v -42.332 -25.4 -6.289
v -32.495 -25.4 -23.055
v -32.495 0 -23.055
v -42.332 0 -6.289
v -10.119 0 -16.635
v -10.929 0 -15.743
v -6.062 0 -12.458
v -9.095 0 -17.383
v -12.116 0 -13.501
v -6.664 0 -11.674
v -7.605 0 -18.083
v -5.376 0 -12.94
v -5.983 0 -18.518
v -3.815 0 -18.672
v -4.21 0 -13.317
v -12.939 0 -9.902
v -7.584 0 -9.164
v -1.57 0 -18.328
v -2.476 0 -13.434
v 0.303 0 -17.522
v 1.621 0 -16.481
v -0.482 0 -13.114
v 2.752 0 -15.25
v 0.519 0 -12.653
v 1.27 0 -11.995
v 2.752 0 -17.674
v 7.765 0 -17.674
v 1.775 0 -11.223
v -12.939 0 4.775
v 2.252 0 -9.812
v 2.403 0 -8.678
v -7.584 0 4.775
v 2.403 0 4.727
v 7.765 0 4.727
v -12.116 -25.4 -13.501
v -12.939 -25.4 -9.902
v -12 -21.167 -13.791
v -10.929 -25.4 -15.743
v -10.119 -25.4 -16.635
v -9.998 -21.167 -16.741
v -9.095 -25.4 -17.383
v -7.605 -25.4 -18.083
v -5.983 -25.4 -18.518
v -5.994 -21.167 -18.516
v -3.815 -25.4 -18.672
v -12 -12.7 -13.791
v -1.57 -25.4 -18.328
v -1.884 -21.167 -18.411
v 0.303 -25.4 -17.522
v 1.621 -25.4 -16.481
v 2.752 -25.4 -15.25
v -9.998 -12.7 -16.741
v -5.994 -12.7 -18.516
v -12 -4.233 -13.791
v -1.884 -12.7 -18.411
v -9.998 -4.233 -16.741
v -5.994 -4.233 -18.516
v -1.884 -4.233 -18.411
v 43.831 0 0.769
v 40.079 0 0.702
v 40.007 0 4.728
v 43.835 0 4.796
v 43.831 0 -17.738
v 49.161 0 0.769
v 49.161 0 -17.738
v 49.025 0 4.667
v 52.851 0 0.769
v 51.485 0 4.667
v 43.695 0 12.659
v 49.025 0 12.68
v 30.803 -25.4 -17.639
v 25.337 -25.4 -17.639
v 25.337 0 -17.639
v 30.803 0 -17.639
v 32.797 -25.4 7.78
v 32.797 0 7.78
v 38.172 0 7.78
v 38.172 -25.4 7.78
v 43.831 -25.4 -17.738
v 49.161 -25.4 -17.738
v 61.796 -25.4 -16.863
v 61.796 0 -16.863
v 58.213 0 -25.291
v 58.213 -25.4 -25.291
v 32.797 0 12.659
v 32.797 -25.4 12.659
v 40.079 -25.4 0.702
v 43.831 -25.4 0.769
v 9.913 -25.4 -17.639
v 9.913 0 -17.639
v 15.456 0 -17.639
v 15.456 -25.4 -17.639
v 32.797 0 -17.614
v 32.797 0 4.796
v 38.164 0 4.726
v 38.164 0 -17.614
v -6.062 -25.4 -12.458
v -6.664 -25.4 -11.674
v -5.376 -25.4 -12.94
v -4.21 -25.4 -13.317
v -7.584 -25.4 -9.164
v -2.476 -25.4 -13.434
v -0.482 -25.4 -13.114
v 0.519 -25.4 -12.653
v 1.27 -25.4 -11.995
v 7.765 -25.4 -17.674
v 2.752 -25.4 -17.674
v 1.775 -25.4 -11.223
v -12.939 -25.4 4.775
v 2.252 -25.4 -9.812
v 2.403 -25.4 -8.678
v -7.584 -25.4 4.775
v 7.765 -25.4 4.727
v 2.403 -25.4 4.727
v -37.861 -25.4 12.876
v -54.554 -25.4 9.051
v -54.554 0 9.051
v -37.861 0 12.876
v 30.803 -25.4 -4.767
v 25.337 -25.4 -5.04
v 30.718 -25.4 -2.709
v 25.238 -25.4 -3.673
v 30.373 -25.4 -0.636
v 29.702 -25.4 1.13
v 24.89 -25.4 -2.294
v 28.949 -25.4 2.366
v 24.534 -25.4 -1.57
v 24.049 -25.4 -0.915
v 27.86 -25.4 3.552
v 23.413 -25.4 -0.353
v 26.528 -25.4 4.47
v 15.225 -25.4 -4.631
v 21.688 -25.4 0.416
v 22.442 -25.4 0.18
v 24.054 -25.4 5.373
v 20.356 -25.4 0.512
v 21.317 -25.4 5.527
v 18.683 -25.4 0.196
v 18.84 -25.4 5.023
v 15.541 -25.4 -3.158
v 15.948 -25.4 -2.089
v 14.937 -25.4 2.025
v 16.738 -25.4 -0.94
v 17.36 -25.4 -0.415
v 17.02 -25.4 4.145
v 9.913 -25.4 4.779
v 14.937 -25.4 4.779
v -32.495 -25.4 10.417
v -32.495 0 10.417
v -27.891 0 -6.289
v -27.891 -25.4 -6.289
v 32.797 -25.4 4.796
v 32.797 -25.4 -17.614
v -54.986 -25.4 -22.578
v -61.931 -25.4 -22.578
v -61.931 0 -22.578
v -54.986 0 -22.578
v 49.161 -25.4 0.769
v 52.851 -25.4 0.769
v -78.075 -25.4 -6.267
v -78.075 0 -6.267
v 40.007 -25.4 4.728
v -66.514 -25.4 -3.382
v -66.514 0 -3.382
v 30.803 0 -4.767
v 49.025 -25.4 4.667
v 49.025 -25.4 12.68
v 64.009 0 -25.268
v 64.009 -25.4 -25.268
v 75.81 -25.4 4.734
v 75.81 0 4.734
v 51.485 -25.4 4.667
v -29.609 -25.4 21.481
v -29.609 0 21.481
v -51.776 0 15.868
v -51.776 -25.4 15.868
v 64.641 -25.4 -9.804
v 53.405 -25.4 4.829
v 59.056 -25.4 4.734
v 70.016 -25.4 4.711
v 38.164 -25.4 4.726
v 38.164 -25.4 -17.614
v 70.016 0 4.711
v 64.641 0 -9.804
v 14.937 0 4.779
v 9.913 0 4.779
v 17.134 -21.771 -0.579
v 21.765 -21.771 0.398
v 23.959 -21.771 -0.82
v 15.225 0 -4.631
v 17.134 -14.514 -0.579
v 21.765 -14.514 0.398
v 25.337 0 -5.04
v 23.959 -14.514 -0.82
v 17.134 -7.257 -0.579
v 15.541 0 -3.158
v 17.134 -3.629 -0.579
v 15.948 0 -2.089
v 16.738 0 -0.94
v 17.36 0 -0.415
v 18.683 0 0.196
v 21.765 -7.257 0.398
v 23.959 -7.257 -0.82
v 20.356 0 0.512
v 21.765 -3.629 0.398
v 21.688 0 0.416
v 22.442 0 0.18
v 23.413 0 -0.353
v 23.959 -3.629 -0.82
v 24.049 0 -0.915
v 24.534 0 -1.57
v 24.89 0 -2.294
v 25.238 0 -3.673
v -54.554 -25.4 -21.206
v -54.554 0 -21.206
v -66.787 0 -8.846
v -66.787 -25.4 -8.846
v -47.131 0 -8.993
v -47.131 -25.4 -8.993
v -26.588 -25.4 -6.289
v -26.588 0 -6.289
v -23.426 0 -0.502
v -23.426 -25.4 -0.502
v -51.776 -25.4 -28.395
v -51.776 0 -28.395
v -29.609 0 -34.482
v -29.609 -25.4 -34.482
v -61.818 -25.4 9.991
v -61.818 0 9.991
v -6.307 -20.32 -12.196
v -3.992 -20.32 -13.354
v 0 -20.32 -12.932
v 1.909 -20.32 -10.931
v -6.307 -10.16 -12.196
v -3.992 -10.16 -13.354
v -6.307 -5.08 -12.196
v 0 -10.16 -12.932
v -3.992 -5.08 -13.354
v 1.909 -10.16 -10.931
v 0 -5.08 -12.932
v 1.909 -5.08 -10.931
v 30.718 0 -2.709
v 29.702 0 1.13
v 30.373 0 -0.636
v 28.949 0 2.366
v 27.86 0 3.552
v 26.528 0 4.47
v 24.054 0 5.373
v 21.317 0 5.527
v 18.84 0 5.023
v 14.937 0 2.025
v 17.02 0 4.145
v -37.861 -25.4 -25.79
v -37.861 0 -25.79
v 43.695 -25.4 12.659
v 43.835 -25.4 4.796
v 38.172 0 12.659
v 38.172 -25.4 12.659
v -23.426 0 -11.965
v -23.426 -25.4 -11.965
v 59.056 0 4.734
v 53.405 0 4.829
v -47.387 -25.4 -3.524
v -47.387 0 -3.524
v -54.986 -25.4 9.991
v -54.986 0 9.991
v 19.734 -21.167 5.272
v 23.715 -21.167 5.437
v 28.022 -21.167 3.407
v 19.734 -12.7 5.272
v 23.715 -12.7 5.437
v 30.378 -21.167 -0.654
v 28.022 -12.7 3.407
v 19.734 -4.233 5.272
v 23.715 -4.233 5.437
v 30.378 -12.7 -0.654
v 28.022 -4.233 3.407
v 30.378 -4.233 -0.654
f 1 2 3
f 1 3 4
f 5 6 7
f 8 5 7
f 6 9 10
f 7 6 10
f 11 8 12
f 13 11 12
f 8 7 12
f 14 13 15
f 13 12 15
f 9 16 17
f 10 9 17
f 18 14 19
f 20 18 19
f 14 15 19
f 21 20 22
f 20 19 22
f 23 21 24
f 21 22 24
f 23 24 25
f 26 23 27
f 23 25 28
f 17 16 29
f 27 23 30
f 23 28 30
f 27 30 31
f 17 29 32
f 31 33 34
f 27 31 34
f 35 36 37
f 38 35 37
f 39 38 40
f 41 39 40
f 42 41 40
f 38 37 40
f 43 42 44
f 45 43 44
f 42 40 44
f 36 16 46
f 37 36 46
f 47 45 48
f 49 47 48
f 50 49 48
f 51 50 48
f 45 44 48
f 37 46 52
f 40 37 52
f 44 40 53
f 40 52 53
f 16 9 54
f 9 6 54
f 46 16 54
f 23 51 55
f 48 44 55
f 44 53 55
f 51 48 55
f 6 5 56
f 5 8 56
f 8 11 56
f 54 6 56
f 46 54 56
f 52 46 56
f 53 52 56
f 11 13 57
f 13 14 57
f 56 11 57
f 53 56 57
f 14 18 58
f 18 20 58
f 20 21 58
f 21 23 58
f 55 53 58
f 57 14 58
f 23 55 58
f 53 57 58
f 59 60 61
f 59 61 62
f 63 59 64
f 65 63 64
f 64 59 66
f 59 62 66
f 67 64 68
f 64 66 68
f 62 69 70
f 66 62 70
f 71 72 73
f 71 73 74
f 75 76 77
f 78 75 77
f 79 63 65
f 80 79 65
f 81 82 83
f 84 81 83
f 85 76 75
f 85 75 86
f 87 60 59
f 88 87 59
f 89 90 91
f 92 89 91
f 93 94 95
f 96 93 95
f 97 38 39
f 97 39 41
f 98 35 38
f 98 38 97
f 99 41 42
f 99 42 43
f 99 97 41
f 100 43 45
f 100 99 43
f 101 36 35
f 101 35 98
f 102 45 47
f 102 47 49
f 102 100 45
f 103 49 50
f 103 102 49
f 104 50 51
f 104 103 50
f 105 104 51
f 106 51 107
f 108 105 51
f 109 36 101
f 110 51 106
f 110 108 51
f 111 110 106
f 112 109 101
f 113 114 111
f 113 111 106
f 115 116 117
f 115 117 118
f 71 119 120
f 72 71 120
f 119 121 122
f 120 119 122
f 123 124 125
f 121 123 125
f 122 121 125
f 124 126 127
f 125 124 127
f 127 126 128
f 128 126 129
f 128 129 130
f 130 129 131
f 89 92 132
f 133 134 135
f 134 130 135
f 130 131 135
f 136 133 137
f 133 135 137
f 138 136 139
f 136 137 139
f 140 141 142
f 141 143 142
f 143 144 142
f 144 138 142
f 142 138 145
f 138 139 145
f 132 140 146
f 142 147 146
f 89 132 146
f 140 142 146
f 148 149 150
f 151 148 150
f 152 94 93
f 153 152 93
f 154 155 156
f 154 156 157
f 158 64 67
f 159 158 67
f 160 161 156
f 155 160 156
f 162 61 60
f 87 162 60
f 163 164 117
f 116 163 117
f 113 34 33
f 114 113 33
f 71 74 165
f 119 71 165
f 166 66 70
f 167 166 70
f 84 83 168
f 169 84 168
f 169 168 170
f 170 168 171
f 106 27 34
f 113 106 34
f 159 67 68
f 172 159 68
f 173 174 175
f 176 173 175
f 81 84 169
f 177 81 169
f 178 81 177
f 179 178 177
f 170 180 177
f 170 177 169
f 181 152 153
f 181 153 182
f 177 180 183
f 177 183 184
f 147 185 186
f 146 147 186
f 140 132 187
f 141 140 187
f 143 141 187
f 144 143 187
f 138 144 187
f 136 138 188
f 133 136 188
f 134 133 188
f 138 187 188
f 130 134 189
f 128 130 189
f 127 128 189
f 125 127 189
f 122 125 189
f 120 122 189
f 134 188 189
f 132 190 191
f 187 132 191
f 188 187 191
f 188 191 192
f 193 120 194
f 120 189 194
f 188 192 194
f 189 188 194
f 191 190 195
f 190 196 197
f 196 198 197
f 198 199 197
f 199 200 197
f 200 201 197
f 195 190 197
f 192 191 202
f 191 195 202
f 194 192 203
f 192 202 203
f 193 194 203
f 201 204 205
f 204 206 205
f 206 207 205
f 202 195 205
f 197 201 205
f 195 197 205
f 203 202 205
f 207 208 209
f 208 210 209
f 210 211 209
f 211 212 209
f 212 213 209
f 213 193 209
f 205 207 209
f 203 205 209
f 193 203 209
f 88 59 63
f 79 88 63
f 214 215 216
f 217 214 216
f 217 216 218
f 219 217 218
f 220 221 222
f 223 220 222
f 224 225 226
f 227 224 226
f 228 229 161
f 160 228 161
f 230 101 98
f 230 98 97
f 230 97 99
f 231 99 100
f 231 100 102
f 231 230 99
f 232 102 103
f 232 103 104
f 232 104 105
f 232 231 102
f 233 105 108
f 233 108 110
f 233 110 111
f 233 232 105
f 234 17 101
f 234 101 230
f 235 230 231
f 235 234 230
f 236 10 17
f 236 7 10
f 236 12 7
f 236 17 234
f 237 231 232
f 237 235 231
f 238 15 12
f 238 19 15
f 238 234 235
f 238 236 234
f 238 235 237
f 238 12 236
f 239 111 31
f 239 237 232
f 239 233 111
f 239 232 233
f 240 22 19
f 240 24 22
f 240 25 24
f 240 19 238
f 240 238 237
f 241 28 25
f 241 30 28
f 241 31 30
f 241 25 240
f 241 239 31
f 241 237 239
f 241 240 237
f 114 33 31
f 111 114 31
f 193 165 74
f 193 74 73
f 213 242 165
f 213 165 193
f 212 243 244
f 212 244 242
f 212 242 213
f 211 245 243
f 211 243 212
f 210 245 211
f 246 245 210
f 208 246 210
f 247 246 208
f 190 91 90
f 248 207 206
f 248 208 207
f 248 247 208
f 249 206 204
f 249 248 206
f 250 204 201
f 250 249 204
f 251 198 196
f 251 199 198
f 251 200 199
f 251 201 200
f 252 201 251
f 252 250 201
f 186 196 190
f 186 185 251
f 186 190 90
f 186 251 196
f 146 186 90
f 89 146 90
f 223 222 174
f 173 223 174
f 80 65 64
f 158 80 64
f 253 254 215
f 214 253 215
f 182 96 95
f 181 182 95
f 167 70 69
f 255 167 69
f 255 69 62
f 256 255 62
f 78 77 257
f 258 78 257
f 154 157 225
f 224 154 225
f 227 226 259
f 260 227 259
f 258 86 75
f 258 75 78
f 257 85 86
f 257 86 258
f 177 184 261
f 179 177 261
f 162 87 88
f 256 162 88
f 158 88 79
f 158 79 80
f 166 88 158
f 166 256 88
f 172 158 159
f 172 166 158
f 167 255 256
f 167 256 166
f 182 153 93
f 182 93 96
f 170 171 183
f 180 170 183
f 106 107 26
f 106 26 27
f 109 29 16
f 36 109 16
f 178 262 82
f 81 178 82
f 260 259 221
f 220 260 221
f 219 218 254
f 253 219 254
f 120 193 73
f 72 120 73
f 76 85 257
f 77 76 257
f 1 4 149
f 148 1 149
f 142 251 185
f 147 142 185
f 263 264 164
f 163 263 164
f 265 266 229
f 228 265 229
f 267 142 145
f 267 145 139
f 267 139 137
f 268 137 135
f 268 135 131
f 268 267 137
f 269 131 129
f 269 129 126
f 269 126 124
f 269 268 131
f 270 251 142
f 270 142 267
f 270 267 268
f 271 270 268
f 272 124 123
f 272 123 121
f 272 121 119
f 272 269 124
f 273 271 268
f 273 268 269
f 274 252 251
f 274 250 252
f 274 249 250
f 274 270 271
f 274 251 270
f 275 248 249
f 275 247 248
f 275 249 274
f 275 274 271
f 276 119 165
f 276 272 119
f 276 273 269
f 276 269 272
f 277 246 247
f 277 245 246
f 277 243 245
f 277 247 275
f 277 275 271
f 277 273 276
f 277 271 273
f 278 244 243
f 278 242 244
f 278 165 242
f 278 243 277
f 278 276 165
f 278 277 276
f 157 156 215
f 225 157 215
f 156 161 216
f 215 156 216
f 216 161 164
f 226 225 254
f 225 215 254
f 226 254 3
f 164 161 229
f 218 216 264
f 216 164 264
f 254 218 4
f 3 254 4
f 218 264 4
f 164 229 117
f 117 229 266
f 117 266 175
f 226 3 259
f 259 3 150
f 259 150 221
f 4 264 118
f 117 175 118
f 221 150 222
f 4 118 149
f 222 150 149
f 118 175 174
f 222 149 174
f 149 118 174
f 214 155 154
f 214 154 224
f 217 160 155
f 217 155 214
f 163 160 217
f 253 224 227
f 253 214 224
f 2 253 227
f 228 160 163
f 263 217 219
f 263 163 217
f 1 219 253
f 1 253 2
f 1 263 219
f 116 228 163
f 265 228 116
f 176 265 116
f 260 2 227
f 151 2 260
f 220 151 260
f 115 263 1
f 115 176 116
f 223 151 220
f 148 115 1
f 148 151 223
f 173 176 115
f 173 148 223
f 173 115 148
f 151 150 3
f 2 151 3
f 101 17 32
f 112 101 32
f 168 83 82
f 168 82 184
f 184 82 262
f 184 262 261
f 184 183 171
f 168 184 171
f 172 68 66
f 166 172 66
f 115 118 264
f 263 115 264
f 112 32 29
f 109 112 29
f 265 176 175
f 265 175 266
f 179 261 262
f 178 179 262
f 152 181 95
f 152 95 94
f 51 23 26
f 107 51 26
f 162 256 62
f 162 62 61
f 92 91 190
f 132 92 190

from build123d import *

# Parameters (mm, degrees)
F1_DEPTH = 25.4
F0_W     = 5.3741969168
F0_H     = 4.8786038533


with BuildPart() as f1:
    # F0 (on Front) → F1 (new body)
    with BuildSketch(Plane.XZ):
        Polygon((-61.8175342679, 9.9913803861), (-78.0754983425, -6.2665827572), (-61.931412667, -22.5775633007), (-54.9864582717, -22.5775633007), (-51.7756640911, -28.3953542085), (-29.6092871577, -34.4820693135), (-23.4263148159, -11.9651462883), (-26.5882525722, -6.2885108306), (-23.4263148159, -0.5017970689), (-29.6092871577, 21.4808750898), (-51.7756640911, 15.8675070852), (-54.9864582717, 9.9913803861), align=None)
        Polygon((-54.5538974927, -21.2059187205), (-66.7869821191, -8.8463705033), (-47.1313082578, -8.9928300249), (-37.8613149982, -25.7895723467), align=None, mode=Mode.SUBTRACT)
        Polygon((-66.5137395263, -3.381509101), (-54.5538974927, 9.0510509908), (-37.8613149982, 12.8764538094), (-47.3867684548, -3.524029121), align=None, mode=Mode.SUBTRACT)
        Polygon((-32.4949771166, -23.0550114065), (-42.331725359, -6.2885108306), (-32.4949771166, 10.4172667488), (-27.8910261588, -6.2885108306), align=None, mode=Mode.SUBTRACT)
    extrude(amount=F1_DEPTH)


with BuildPart() as f1b:
    # F0 (on Front) → F1, piece 2 (new body)
    with BuildSketch(Plane.XZ):
        with BuildLine():
            Line((-7.5835298893, 4.7745979391), (-12.939106673, 4.7745979391))
            Line((-12.939106673, 4.7745979391), (-12.939106673, -9.901910089))
            add(Edge.make_bspline(
                [(-12.939106673, -9.901910089), (-12.8195294496, -11.335424735), (-12.1730706321, -13.8144036121), (-10.2817312423, -17.0783601025), (-6.0437932119, -18.8434973108), (-1.891398807, -18.6556372476), (0.9541501655, -17.3179992209), (2.1609917179, -15.9289006997), (2.7519573923, -15.2504704893)],
                knots=[0, 0, 0, 0, 0.1757211311, 0.3415823641, 0.5254318819, 0.703542475, 0.8561343818, 1, 1, 1, 1], degree=3))
            Line((2.7519573923, -15.2504704893), (2.7519573923, -17.6735110581))
            Line((2.7519573923, -17.6735110581), (7.7647762373, -17.6735110581))
            Line((7.7647762373, -17.6735110581), (7.7647762373, 4.7265798785))
            Line((7.7647762373, 4.7265798785), (2.4030324872, 4.7265798785))
            Line((2.4030324872, 4.7265798785), (2.4030324872, -8.6782282079))
            add(Edge.make_bspline(
                [(-7.5835298893, -9.1644796788), (-7.2848614749, -10.2725499275), (-6.6139134778, -12.4818270071), (-4.0439647098, -13.6263171971), (0.2146485756, -13.3446000384), (2.0819233672, -11.2007439975), (2.402876918, -9.1158028323), (2.4030324872, -8.6782282079)],
                knots=[0, 0, 0, 0, 0.2107151722, 0.3976154728, 0.6303740039, 0.8235724182, 1, 1, 1, 1], degree=3))
            Line((-7.5835298893, -9.1644796788), (-7.5835298893, 4.7745979391))
        make_face()
    extrude(amount=F1_DEPTH)


with BuildPart() as f1c:
    # F0 (on Front) → F1, piece 3 (new body)
    with BuildSketch(Plane.XZ):
        with BuildLine():
            add(Edge.make_bspline(
                [(14.9370869622, 2.0253402181), (15.534431752, 2.7609794713), (16.7580901476, 4.2679335182), (19.7599927713, 5.4576080514), (23.7961951925, 5.7978179931), (28.4112301272, 3.8294664448), (30.7187893168, -0.5854952277), (30.7756019621, -3.4031307986), (30.8031048626, -4.7671431676)],
                knots=[0, 0, 0, 0, 0.1419986402, 0.2908836425, 0.4598336653, 0.6445012121, 0.827903669, 1, 1, 1, 1], degree=3))
            Line((14.9370869622, 2.0253402181), (14.9370869622, 4.7786119394))
            Line((14.9370869622, 4.7786119394), (9.9125150591, 4.7786119394))
            Line((9.9125150591, 4.7786119394), (9.9125150591, -17.6387447864))
            Line((9.9125150591, -17.6387447864), (15.4559724033, -17.6387447864))
            Line((15.4559724033, -17.6387447864), (15.2249624953, -4.6305218711))
            add(Edge.make_bspline(
                [(15.2249624953, -4.6305218711), (15.3516237058, -3.926779829), (15.6113315095, -2.4838179354), (16.957148298, -0.3426604733), (19.4850934176, 0.5156936091), (21.7872988929, 0.611104947), (24.1610164356, -0.6280850599), (25.2478034031, -2.8977320199), (25.3079409714, -4.3409012448), (25.3370888531, -5.040386226)],
                knots=[0, 0, 0, 0, 0.1373880895, 0.2817023367, 0.4307768151, 0.571573078, 0.7194363083, 0.8640145, 1, 1, 1, 1], degree=3))
            Line((25.3370888531, -5.040386226), (25.3370888531, -17.6387447864))
            Line((25.3370888531, -17.6387447864), (30.8031048626, -17.6387447864))
            Line((30.8031048626, -17.6387447864), (30.8031048626, -4.7671431676))
        make_face()
    extrude(amount=F1_DEPTH)


with BuildPart() as f1d:
    # F0 (on Front) → F1, piece 4 (new body)
    with BuildSketch(Plane.XZ):
        Polygon((38.1637066603, 4.7257477418), (32.7974595129, 4.7963648103), (32.7974595129, -17.6140572876), (38.1637066603, -17.6140572876), align=None)
    extrude(amount=F1_DEPTH)


with BuildPart() as f1e:
    # F0 (on Front) → F1, piece 5 (new body)
    with BuildSketch(Plane.XZ):
        with Locations((35.4845579714, 10.2194794454)):
            Rectangle(F0_W, F0_H)
    extrude(amount=F1_DEPTH)


with BuildPart() as f1f:
    # F0 (on Front) → F1, piece 6 (new body)
    with BuildSketch(Plane.XZ):
        Polygon((49.0248128772, 12.6798572019), (43.6954498291, 12.658781372), (43.8350765974, 4.7963648103), (40.0072335546, 4.7283870646), (40.0787388816, 0.7019050787), (43.8309807873, 0.7685402419), (43.8309807873, -17.738442868), (49.1614602506, -17.738442868), (49.1614602506, 0.7685402419), (52.8510250151, 0.7685402419), (51.4845177531, 4.6674897894), (49.0248128772, 4.6674897894), align=None)
    extrude(amount=F1_DEPTH)


with BuildPart() as f1g:
    # F0 (on Front) → F1, piece 7 (new body)
    with BuildSketch(Plane.XZ):
        Polygon((59.0563341975, 4.7340947203), (53.4049682319, 4.8287753016), (61.7959983647, -16.8625749648), (58.2133606076, -25.2905450761), (64.0087189905, -25.2676263922), (75.8104547858, 4.7340947203), (70.0159296339, 4.7111793315), (64.6410360932, -9.8041519523), align=None)
    extrude(amount=F1_DEPTH)


solid = Compound([f1.part, f1b.part, f1c.part, f1d.part, f1e.part, f1f.part, f1g.part])
